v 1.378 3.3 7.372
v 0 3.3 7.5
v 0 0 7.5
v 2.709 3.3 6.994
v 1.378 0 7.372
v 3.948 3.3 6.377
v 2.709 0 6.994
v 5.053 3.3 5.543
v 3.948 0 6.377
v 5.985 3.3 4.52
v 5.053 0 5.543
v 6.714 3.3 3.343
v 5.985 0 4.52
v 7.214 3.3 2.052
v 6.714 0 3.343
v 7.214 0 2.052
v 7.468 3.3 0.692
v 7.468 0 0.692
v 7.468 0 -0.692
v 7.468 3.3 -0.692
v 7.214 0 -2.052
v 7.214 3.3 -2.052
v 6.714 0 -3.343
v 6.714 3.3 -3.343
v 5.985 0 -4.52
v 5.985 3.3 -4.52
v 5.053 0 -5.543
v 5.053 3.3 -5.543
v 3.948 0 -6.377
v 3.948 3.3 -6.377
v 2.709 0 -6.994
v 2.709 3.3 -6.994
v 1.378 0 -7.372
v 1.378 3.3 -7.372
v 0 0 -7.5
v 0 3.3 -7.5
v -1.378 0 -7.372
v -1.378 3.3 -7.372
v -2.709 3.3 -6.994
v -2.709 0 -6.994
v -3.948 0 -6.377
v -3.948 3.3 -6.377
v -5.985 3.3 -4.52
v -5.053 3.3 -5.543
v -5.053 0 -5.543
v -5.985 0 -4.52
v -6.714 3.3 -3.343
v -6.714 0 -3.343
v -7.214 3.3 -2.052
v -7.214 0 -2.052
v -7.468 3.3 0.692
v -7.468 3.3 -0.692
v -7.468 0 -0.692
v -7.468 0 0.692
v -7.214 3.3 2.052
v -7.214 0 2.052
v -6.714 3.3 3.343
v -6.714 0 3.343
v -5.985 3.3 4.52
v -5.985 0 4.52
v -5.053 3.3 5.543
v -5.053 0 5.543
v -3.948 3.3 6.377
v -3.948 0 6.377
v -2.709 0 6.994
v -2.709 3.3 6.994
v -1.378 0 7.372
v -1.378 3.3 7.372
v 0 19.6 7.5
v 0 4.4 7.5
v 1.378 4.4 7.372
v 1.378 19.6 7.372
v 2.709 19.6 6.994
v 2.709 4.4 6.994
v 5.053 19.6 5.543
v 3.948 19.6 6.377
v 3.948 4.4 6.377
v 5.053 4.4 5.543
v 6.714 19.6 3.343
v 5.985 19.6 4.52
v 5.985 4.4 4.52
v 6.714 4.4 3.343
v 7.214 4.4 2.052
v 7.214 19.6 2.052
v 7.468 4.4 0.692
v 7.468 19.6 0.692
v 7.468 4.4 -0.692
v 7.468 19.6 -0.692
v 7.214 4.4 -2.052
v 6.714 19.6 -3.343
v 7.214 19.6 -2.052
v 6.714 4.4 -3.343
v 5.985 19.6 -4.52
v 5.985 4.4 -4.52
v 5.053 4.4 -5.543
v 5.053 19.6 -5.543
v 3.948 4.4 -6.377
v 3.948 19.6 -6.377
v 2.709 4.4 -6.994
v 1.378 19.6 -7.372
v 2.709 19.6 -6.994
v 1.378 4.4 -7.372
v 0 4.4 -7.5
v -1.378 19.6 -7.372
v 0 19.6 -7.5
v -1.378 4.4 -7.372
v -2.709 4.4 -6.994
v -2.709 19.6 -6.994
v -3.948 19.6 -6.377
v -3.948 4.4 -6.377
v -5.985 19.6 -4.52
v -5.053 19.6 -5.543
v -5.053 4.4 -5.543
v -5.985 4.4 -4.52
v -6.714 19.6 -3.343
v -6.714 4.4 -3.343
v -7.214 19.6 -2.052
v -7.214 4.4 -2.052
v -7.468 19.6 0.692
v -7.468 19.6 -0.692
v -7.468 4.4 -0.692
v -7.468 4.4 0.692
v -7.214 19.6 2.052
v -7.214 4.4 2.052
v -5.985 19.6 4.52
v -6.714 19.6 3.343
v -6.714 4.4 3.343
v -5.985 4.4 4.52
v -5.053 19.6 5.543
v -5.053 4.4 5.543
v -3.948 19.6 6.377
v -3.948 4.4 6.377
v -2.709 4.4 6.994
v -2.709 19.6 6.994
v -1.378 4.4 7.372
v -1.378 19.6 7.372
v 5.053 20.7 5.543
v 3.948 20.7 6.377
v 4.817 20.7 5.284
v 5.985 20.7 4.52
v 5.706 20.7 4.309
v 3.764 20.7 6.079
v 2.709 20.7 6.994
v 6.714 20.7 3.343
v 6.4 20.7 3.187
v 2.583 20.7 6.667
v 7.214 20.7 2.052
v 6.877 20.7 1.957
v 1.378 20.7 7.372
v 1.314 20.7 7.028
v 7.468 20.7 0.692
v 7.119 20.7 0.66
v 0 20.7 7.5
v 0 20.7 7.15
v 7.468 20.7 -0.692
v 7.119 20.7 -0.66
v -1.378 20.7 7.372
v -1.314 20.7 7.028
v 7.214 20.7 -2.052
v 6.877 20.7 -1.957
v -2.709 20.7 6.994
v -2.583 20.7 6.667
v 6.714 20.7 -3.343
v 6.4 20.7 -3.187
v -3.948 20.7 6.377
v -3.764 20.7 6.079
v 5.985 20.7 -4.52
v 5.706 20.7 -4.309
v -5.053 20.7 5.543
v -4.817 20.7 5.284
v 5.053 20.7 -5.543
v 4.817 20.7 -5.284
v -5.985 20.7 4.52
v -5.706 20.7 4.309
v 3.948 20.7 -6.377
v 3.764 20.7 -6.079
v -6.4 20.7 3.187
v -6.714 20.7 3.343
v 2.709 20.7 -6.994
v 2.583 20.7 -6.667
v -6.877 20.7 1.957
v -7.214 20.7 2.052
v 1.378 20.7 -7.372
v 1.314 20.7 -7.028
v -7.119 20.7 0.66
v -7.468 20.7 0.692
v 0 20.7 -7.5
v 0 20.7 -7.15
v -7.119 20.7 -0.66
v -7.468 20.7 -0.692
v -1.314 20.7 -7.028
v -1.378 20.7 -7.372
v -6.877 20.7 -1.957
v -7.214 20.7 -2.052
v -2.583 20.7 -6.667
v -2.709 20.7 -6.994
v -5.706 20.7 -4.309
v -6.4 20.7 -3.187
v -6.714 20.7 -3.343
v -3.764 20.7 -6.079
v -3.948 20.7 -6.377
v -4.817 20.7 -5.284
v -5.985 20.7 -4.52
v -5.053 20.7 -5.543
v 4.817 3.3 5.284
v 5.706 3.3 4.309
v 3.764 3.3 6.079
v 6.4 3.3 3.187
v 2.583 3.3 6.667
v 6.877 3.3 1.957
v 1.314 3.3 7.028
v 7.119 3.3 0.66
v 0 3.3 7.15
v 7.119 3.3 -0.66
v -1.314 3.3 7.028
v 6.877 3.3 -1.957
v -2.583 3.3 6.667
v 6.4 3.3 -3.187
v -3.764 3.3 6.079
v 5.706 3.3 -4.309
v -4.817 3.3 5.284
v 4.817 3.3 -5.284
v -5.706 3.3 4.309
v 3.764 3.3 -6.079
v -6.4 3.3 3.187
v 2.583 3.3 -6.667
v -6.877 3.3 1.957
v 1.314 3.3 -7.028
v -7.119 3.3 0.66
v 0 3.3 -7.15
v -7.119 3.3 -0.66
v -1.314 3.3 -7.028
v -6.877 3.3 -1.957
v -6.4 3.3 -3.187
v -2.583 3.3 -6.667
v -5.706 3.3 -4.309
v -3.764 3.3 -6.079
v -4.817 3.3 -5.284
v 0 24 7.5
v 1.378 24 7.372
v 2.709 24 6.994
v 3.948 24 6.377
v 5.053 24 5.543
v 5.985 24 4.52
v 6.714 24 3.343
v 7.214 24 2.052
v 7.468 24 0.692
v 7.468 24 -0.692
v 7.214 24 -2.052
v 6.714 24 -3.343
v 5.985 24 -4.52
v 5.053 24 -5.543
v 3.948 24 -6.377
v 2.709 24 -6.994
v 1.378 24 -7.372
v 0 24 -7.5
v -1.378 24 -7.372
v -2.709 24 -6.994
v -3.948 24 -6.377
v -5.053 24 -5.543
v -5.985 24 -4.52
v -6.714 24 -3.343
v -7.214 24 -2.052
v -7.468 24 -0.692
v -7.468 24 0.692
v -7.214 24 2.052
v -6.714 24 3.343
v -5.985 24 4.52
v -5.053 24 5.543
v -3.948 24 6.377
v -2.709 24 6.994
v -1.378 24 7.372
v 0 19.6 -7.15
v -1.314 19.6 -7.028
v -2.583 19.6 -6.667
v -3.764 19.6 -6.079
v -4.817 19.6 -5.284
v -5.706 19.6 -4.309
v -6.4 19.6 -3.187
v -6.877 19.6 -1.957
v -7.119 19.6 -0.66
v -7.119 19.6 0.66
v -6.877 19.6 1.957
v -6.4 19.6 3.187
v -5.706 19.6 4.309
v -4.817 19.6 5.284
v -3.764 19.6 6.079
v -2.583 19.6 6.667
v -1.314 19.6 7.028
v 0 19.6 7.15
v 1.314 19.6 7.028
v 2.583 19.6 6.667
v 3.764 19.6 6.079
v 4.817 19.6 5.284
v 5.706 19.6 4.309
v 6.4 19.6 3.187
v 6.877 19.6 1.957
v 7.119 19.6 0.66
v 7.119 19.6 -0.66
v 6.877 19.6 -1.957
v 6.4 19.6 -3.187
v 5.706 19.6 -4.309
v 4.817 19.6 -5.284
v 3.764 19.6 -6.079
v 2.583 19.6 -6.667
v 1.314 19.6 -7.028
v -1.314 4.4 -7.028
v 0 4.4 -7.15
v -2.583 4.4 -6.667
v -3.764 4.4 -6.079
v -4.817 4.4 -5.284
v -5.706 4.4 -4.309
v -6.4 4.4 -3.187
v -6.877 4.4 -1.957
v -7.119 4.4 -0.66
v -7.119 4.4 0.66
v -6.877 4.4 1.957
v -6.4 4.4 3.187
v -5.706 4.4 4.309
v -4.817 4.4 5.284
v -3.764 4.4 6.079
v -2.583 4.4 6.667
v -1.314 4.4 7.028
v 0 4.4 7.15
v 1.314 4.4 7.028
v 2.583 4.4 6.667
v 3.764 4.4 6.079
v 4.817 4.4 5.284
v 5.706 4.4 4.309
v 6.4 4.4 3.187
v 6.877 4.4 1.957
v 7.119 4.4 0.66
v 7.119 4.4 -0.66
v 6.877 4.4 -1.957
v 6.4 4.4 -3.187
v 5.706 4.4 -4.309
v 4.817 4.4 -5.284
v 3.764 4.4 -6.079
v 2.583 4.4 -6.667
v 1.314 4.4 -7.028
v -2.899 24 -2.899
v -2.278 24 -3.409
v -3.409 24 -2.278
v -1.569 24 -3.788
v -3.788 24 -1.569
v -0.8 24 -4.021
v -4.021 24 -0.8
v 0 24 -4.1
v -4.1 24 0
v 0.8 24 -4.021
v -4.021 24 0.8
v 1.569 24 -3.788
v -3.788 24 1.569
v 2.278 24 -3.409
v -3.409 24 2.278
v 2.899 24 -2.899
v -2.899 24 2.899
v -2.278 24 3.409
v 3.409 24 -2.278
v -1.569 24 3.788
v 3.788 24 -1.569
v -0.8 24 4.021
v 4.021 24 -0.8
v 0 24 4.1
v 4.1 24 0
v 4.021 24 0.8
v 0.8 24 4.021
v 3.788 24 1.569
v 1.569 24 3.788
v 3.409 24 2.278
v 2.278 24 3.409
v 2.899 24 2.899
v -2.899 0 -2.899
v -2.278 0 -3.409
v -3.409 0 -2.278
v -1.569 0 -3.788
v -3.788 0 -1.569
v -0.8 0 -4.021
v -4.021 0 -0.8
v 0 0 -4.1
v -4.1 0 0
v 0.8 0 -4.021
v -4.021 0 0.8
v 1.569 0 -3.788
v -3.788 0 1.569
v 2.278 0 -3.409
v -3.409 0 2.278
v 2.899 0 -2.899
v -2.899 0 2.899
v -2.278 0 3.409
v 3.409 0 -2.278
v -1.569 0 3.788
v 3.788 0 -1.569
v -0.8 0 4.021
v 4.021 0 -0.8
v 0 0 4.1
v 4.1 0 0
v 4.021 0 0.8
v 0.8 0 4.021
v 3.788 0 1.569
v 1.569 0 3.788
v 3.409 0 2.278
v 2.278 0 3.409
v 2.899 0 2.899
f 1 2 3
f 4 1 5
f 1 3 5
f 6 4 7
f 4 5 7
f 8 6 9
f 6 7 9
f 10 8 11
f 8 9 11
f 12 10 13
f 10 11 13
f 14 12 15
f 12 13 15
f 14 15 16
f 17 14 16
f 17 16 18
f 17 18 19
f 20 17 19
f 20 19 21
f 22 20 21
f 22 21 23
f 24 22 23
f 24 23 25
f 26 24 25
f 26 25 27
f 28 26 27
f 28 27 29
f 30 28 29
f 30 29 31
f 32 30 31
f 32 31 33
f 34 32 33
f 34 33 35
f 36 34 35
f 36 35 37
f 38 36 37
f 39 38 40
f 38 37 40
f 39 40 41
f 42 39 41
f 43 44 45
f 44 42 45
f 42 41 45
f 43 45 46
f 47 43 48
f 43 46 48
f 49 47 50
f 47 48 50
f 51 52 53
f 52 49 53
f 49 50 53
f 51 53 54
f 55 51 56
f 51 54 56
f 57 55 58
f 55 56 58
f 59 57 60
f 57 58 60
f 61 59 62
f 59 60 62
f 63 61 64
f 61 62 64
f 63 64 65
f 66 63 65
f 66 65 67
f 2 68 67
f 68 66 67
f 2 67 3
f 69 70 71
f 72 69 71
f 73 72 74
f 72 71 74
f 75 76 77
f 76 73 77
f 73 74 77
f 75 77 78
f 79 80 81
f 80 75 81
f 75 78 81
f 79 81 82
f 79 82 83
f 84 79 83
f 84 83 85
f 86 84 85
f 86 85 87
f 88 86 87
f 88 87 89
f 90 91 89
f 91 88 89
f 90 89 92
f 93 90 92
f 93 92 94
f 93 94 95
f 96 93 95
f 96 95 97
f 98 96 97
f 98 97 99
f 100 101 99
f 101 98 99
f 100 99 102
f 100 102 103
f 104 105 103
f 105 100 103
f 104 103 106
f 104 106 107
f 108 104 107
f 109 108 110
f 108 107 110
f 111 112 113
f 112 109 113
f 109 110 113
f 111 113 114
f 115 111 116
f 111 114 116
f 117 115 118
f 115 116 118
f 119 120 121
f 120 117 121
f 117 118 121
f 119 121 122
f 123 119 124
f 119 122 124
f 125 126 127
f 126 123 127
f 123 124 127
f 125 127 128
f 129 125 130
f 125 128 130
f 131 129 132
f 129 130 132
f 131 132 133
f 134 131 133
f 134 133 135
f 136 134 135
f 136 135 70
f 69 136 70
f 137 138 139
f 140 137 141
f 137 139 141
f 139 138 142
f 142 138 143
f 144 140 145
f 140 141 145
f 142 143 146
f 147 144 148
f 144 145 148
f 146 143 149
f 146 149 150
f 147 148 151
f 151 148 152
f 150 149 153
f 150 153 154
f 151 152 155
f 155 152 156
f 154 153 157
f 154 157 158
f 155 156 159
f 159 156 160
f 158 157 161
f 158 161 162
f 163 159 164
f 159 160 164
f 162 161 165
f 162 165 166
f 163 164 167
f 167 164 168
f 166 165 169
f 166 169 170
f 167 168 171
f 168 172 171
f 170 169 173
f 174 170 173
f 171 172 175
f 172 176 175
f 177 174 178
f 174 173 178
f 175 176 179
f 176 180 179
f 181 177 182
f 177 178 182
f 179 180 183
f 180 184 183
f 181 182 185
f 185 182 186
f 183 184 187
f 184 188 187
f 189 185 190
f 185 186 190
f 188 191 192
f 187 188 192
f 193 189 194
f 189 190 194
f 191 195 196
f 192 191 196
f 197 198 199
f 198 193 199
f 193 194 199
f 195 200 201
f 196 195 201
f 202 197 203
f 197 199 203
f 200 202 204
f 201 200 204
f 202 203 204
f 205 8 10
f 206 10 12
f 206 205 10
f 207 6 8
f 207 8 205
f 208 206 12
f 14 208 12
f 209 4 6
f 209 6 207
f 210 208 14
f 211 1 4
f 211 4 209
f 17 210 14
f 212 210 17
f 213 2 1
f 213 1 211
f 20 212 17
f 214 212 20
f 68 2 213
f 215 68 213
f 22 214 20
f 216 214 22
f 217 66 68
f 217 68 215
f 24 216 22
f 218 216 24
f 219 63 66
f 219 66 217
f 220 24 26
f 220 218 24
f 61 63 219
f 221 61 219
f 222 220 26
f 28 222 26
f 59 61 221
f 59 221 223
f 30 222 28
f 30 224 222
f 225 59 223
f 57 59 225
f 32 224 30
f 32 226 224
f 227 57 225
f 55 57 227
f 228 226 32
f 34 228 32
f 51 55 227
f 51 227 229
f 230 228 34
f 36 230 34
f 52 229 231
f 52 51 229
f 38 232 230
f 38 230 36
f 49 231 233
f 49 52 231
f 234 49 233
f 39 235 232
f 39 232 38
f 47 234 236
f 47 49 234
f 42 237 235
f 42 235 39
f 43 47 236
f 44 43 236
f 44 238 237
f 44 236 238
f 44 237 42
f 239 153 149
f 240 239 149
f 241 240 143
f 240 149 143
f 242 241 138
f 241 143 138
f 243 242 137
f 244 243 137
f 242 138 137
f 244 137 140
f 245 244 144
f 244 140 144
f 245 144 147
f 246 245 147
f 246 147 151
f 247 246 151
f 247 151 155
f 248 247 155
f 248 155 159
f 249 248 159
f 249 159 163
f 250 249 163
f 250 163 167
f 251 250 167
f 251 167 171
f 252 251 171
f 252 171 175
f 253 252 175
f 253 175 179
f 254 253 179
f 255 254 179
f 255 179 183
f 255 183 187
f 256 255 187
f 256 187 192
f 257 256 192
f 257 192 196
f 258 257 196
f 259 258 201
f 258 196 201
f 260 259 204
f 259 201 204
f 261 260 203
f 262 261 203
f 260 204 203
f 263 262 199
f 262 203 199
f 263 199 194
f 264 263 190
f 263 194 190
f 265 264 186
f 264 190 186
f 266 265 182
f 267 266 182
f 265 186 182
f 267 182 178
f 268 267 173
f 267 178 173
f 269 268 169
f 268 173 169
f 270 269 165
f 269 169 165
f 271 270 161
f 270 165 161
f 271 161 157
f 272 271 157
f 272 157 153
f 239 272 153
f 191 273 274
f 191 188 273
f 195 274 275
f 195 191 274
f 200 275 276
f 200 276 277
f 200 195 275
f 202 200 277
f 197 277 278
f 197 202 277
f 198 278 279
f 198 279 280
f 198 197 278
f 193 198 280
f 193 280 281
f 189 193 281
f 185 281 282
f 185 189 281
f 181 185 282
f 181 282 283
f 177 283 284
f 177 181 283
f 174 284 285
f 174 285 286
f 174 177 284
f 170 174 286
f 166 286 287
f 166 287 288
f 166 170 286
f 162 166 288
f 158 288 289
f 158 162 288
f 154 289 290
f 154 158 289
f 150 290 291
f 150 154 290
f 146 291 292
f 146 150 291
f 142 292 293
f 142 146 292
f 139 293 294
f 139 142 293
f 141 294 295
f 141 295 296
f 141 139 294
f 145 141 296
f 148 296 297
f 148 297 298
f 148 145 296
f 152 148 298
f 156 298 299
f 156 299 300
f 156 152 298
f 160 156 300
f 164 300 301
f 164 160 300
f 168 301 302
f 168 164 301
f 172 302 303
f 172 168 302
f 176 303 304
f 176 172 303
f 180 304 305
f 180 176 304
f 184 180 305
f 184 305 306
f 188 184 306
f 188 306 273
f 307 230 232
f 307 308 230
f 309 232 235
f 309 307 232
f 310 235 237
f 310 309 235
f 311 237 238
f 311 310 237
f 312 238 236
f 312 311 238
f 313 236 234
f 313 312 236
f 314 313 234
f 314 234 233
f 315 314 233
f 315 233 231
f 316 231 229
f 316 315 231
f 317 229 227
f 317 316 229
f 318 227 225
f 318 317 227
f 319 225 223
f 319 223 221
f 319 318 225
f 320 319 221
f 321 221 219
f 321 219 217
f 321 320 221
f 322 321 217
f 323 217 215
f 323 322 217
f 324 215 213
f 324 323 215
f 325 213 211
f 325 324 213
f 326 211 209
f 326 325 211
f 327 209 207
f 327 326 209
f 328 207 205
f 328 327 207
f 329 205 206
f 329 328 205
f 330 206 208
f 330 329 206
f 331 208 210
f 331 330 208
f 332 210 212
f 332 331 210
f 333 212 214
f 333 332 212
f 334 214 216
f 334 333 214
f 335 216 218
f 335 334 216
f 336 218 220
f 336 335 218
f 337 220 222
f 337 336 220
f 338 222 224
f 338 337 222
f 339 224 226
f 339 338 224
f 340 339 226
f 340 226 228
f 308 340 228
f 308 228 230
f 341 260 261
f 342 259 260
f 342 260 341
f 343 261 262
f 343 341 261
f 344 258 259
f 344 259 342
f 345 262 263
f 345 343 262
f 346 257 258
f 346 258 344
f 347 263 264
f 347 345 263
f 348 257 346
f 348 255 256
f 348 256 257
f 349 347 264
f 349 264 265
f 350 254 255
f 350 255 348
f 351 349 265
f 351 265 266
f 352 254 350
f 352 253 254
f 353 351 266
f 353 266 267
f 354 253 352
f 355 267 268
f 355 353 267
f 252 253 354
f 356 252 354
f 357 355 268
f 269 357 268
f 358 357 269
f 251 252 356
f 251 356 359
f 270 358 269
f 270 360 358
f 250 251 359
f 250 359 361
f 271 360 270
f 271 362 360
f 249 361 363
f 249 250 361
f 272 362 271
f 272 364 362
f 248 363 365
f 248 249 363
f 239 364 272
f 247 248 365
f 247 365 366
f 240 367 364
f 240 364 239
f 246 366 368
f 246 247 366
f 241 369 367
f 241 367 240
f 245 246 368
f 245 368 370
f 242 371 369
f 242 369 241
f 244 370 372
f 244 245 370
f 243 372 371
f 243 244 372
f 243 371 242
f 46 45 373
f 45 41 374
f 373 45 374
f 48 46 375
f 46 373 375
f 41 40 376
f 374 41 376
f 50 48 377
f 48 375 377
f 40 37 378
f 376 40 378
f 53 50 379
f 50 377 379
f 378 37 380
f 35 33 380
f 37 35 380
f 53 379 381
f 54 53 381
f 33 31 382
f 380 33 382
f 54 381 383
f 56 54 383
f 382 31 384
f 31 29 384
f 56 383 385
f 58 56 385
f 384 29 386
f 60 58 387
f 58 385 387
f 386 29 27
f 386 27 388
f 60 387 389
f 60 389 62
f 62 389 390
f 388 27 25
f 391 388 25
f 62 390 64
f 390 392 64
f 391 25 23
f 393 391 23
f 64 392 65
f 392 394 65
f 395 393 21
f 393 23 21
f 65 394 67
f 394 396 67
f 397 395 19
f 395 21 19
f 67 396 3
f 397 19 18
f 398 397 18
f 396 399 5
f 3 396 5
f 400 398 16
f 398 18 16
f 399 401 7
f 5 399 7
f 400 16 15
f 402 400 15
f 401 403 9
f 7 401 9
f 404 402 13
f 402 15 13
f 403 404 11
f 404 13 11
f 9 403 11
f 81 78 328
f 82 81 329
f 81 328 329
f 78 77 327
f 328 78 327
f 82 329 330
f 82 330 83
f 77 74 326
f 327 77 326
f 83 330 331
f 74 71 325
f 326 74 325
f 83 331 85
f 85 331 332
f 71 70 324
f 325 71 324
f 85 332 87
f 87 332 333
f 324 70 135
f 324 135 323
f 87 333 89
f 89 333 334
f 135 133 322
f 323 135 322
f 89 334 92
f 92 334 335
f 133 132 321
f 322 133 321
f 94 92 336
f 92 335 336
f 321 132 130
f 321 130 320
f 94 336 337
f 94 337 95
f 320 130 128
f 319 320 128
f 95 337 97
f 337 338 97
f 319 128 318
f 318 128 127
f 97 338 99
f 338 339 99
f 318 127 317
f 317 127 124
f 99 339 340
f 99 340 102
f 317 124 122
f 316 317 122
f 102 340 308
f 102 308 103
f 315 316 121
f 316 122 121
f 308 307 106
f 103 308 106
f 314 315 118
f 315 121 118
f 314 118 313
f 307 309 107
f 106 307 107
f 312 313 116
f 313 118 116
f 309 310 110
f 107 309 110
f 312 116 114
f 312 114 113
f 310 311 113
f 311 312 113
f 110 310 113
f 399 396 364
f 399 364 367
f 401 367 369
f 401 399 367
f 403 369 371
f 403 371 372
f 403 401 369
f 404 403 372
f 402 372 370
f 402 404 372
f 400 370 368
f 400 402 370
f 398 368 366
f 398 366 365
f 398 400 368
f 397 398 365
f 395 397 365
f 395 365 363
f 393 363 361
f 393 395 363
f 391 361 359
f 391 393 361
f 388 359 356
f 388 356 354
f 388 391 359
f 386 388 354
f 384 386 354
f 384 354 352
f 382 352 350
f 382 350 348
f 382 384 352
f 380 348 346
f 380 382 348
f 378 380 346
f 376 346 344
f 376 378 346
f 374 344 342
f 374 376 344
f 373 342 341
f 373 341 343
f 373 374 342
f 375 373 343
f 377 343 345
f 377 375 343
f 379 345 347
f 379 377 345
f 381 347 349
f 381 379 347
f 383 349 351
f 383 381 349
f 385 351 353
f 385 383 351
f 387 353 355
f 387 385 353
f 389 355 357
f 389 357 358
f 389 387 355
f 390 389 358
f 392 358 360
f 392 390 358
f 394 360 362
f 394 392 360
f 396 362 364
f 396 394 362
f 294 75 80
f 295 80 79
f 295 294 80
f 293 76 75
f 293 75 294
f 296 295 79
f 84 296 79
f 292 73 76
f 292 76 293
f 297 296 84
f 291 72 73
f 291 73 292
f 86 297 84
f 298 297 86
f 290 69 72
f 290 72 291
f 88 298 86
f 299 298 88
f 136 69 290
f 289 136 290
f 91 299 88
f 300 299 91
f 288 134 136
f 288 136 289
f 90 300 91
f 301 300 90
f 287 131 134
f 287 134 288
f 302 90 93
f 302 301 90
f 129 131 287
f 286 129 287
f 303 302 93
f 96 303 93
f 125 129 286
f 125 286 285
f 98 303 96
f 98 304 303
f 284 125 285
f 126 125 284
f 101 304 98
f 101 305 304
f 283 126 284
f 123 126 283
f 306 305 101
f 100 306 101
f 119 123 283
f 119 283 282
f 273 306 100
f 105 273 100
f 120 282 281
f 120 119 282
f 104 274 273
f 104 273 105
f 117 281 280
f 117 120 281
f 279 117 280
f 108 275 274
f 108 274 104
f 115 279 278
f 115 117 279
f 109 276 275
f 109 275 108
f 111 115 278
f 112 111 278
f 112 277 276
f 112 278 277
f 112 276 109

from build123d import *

# Parameters (mm, degrees)
CROQUIS1_R              = 7.5
CROQUIS1_R_2            = 4.1
SALIENTE_EXTRUIR1_DEPTH = 24
CROQUIS2_W              = 0.35
CROQUIS2_H              = 1.1


with BuildPart() as part:
    # Croquis1 → Saliente-Extruir1 (new body)
    with BuildSketch(Plane(origin=(0, 0, 0), x_dir=(1, 0, 0), z_dir=(0, 1, 0))):
        with Locations(Location((0, 0, 0), (0, 0, 270))):
            Circle(CROQUIS1_R)
        with Locations(Location((0, 0, 0), (0, 0, 270))):
            Circle(CROQUIS1_R_2, mode=Mode.SUBTRACT)
    extrude(amount=SALIENTE_EXTRUIR1_DEPTH)

    # Croquis2 → Cortar-Revolución1 (revolve, cut)
    with BuildSketch(Plane.XY, mode=Mode.PRIVATE) as cortar_revoluci_n1_sk:
        with Locations((-7.325, 20.15)):
            Rectangle(CROQUIS2_W, CROQUIS2_H)
        with Locations((-7.325, 3.85)):
            Rectangle(CROQUIS2_W, CROQUIS2_H)
    revolve(cortar_revoluci_n1_sk.sketch.rotate(Axis((0, 0, 0), (0, 1, 0)), 270), axis=Axis((0, 0, 0), (0, 1, 0)), mode=Mode.SUBTRACT)


solid = part.part
